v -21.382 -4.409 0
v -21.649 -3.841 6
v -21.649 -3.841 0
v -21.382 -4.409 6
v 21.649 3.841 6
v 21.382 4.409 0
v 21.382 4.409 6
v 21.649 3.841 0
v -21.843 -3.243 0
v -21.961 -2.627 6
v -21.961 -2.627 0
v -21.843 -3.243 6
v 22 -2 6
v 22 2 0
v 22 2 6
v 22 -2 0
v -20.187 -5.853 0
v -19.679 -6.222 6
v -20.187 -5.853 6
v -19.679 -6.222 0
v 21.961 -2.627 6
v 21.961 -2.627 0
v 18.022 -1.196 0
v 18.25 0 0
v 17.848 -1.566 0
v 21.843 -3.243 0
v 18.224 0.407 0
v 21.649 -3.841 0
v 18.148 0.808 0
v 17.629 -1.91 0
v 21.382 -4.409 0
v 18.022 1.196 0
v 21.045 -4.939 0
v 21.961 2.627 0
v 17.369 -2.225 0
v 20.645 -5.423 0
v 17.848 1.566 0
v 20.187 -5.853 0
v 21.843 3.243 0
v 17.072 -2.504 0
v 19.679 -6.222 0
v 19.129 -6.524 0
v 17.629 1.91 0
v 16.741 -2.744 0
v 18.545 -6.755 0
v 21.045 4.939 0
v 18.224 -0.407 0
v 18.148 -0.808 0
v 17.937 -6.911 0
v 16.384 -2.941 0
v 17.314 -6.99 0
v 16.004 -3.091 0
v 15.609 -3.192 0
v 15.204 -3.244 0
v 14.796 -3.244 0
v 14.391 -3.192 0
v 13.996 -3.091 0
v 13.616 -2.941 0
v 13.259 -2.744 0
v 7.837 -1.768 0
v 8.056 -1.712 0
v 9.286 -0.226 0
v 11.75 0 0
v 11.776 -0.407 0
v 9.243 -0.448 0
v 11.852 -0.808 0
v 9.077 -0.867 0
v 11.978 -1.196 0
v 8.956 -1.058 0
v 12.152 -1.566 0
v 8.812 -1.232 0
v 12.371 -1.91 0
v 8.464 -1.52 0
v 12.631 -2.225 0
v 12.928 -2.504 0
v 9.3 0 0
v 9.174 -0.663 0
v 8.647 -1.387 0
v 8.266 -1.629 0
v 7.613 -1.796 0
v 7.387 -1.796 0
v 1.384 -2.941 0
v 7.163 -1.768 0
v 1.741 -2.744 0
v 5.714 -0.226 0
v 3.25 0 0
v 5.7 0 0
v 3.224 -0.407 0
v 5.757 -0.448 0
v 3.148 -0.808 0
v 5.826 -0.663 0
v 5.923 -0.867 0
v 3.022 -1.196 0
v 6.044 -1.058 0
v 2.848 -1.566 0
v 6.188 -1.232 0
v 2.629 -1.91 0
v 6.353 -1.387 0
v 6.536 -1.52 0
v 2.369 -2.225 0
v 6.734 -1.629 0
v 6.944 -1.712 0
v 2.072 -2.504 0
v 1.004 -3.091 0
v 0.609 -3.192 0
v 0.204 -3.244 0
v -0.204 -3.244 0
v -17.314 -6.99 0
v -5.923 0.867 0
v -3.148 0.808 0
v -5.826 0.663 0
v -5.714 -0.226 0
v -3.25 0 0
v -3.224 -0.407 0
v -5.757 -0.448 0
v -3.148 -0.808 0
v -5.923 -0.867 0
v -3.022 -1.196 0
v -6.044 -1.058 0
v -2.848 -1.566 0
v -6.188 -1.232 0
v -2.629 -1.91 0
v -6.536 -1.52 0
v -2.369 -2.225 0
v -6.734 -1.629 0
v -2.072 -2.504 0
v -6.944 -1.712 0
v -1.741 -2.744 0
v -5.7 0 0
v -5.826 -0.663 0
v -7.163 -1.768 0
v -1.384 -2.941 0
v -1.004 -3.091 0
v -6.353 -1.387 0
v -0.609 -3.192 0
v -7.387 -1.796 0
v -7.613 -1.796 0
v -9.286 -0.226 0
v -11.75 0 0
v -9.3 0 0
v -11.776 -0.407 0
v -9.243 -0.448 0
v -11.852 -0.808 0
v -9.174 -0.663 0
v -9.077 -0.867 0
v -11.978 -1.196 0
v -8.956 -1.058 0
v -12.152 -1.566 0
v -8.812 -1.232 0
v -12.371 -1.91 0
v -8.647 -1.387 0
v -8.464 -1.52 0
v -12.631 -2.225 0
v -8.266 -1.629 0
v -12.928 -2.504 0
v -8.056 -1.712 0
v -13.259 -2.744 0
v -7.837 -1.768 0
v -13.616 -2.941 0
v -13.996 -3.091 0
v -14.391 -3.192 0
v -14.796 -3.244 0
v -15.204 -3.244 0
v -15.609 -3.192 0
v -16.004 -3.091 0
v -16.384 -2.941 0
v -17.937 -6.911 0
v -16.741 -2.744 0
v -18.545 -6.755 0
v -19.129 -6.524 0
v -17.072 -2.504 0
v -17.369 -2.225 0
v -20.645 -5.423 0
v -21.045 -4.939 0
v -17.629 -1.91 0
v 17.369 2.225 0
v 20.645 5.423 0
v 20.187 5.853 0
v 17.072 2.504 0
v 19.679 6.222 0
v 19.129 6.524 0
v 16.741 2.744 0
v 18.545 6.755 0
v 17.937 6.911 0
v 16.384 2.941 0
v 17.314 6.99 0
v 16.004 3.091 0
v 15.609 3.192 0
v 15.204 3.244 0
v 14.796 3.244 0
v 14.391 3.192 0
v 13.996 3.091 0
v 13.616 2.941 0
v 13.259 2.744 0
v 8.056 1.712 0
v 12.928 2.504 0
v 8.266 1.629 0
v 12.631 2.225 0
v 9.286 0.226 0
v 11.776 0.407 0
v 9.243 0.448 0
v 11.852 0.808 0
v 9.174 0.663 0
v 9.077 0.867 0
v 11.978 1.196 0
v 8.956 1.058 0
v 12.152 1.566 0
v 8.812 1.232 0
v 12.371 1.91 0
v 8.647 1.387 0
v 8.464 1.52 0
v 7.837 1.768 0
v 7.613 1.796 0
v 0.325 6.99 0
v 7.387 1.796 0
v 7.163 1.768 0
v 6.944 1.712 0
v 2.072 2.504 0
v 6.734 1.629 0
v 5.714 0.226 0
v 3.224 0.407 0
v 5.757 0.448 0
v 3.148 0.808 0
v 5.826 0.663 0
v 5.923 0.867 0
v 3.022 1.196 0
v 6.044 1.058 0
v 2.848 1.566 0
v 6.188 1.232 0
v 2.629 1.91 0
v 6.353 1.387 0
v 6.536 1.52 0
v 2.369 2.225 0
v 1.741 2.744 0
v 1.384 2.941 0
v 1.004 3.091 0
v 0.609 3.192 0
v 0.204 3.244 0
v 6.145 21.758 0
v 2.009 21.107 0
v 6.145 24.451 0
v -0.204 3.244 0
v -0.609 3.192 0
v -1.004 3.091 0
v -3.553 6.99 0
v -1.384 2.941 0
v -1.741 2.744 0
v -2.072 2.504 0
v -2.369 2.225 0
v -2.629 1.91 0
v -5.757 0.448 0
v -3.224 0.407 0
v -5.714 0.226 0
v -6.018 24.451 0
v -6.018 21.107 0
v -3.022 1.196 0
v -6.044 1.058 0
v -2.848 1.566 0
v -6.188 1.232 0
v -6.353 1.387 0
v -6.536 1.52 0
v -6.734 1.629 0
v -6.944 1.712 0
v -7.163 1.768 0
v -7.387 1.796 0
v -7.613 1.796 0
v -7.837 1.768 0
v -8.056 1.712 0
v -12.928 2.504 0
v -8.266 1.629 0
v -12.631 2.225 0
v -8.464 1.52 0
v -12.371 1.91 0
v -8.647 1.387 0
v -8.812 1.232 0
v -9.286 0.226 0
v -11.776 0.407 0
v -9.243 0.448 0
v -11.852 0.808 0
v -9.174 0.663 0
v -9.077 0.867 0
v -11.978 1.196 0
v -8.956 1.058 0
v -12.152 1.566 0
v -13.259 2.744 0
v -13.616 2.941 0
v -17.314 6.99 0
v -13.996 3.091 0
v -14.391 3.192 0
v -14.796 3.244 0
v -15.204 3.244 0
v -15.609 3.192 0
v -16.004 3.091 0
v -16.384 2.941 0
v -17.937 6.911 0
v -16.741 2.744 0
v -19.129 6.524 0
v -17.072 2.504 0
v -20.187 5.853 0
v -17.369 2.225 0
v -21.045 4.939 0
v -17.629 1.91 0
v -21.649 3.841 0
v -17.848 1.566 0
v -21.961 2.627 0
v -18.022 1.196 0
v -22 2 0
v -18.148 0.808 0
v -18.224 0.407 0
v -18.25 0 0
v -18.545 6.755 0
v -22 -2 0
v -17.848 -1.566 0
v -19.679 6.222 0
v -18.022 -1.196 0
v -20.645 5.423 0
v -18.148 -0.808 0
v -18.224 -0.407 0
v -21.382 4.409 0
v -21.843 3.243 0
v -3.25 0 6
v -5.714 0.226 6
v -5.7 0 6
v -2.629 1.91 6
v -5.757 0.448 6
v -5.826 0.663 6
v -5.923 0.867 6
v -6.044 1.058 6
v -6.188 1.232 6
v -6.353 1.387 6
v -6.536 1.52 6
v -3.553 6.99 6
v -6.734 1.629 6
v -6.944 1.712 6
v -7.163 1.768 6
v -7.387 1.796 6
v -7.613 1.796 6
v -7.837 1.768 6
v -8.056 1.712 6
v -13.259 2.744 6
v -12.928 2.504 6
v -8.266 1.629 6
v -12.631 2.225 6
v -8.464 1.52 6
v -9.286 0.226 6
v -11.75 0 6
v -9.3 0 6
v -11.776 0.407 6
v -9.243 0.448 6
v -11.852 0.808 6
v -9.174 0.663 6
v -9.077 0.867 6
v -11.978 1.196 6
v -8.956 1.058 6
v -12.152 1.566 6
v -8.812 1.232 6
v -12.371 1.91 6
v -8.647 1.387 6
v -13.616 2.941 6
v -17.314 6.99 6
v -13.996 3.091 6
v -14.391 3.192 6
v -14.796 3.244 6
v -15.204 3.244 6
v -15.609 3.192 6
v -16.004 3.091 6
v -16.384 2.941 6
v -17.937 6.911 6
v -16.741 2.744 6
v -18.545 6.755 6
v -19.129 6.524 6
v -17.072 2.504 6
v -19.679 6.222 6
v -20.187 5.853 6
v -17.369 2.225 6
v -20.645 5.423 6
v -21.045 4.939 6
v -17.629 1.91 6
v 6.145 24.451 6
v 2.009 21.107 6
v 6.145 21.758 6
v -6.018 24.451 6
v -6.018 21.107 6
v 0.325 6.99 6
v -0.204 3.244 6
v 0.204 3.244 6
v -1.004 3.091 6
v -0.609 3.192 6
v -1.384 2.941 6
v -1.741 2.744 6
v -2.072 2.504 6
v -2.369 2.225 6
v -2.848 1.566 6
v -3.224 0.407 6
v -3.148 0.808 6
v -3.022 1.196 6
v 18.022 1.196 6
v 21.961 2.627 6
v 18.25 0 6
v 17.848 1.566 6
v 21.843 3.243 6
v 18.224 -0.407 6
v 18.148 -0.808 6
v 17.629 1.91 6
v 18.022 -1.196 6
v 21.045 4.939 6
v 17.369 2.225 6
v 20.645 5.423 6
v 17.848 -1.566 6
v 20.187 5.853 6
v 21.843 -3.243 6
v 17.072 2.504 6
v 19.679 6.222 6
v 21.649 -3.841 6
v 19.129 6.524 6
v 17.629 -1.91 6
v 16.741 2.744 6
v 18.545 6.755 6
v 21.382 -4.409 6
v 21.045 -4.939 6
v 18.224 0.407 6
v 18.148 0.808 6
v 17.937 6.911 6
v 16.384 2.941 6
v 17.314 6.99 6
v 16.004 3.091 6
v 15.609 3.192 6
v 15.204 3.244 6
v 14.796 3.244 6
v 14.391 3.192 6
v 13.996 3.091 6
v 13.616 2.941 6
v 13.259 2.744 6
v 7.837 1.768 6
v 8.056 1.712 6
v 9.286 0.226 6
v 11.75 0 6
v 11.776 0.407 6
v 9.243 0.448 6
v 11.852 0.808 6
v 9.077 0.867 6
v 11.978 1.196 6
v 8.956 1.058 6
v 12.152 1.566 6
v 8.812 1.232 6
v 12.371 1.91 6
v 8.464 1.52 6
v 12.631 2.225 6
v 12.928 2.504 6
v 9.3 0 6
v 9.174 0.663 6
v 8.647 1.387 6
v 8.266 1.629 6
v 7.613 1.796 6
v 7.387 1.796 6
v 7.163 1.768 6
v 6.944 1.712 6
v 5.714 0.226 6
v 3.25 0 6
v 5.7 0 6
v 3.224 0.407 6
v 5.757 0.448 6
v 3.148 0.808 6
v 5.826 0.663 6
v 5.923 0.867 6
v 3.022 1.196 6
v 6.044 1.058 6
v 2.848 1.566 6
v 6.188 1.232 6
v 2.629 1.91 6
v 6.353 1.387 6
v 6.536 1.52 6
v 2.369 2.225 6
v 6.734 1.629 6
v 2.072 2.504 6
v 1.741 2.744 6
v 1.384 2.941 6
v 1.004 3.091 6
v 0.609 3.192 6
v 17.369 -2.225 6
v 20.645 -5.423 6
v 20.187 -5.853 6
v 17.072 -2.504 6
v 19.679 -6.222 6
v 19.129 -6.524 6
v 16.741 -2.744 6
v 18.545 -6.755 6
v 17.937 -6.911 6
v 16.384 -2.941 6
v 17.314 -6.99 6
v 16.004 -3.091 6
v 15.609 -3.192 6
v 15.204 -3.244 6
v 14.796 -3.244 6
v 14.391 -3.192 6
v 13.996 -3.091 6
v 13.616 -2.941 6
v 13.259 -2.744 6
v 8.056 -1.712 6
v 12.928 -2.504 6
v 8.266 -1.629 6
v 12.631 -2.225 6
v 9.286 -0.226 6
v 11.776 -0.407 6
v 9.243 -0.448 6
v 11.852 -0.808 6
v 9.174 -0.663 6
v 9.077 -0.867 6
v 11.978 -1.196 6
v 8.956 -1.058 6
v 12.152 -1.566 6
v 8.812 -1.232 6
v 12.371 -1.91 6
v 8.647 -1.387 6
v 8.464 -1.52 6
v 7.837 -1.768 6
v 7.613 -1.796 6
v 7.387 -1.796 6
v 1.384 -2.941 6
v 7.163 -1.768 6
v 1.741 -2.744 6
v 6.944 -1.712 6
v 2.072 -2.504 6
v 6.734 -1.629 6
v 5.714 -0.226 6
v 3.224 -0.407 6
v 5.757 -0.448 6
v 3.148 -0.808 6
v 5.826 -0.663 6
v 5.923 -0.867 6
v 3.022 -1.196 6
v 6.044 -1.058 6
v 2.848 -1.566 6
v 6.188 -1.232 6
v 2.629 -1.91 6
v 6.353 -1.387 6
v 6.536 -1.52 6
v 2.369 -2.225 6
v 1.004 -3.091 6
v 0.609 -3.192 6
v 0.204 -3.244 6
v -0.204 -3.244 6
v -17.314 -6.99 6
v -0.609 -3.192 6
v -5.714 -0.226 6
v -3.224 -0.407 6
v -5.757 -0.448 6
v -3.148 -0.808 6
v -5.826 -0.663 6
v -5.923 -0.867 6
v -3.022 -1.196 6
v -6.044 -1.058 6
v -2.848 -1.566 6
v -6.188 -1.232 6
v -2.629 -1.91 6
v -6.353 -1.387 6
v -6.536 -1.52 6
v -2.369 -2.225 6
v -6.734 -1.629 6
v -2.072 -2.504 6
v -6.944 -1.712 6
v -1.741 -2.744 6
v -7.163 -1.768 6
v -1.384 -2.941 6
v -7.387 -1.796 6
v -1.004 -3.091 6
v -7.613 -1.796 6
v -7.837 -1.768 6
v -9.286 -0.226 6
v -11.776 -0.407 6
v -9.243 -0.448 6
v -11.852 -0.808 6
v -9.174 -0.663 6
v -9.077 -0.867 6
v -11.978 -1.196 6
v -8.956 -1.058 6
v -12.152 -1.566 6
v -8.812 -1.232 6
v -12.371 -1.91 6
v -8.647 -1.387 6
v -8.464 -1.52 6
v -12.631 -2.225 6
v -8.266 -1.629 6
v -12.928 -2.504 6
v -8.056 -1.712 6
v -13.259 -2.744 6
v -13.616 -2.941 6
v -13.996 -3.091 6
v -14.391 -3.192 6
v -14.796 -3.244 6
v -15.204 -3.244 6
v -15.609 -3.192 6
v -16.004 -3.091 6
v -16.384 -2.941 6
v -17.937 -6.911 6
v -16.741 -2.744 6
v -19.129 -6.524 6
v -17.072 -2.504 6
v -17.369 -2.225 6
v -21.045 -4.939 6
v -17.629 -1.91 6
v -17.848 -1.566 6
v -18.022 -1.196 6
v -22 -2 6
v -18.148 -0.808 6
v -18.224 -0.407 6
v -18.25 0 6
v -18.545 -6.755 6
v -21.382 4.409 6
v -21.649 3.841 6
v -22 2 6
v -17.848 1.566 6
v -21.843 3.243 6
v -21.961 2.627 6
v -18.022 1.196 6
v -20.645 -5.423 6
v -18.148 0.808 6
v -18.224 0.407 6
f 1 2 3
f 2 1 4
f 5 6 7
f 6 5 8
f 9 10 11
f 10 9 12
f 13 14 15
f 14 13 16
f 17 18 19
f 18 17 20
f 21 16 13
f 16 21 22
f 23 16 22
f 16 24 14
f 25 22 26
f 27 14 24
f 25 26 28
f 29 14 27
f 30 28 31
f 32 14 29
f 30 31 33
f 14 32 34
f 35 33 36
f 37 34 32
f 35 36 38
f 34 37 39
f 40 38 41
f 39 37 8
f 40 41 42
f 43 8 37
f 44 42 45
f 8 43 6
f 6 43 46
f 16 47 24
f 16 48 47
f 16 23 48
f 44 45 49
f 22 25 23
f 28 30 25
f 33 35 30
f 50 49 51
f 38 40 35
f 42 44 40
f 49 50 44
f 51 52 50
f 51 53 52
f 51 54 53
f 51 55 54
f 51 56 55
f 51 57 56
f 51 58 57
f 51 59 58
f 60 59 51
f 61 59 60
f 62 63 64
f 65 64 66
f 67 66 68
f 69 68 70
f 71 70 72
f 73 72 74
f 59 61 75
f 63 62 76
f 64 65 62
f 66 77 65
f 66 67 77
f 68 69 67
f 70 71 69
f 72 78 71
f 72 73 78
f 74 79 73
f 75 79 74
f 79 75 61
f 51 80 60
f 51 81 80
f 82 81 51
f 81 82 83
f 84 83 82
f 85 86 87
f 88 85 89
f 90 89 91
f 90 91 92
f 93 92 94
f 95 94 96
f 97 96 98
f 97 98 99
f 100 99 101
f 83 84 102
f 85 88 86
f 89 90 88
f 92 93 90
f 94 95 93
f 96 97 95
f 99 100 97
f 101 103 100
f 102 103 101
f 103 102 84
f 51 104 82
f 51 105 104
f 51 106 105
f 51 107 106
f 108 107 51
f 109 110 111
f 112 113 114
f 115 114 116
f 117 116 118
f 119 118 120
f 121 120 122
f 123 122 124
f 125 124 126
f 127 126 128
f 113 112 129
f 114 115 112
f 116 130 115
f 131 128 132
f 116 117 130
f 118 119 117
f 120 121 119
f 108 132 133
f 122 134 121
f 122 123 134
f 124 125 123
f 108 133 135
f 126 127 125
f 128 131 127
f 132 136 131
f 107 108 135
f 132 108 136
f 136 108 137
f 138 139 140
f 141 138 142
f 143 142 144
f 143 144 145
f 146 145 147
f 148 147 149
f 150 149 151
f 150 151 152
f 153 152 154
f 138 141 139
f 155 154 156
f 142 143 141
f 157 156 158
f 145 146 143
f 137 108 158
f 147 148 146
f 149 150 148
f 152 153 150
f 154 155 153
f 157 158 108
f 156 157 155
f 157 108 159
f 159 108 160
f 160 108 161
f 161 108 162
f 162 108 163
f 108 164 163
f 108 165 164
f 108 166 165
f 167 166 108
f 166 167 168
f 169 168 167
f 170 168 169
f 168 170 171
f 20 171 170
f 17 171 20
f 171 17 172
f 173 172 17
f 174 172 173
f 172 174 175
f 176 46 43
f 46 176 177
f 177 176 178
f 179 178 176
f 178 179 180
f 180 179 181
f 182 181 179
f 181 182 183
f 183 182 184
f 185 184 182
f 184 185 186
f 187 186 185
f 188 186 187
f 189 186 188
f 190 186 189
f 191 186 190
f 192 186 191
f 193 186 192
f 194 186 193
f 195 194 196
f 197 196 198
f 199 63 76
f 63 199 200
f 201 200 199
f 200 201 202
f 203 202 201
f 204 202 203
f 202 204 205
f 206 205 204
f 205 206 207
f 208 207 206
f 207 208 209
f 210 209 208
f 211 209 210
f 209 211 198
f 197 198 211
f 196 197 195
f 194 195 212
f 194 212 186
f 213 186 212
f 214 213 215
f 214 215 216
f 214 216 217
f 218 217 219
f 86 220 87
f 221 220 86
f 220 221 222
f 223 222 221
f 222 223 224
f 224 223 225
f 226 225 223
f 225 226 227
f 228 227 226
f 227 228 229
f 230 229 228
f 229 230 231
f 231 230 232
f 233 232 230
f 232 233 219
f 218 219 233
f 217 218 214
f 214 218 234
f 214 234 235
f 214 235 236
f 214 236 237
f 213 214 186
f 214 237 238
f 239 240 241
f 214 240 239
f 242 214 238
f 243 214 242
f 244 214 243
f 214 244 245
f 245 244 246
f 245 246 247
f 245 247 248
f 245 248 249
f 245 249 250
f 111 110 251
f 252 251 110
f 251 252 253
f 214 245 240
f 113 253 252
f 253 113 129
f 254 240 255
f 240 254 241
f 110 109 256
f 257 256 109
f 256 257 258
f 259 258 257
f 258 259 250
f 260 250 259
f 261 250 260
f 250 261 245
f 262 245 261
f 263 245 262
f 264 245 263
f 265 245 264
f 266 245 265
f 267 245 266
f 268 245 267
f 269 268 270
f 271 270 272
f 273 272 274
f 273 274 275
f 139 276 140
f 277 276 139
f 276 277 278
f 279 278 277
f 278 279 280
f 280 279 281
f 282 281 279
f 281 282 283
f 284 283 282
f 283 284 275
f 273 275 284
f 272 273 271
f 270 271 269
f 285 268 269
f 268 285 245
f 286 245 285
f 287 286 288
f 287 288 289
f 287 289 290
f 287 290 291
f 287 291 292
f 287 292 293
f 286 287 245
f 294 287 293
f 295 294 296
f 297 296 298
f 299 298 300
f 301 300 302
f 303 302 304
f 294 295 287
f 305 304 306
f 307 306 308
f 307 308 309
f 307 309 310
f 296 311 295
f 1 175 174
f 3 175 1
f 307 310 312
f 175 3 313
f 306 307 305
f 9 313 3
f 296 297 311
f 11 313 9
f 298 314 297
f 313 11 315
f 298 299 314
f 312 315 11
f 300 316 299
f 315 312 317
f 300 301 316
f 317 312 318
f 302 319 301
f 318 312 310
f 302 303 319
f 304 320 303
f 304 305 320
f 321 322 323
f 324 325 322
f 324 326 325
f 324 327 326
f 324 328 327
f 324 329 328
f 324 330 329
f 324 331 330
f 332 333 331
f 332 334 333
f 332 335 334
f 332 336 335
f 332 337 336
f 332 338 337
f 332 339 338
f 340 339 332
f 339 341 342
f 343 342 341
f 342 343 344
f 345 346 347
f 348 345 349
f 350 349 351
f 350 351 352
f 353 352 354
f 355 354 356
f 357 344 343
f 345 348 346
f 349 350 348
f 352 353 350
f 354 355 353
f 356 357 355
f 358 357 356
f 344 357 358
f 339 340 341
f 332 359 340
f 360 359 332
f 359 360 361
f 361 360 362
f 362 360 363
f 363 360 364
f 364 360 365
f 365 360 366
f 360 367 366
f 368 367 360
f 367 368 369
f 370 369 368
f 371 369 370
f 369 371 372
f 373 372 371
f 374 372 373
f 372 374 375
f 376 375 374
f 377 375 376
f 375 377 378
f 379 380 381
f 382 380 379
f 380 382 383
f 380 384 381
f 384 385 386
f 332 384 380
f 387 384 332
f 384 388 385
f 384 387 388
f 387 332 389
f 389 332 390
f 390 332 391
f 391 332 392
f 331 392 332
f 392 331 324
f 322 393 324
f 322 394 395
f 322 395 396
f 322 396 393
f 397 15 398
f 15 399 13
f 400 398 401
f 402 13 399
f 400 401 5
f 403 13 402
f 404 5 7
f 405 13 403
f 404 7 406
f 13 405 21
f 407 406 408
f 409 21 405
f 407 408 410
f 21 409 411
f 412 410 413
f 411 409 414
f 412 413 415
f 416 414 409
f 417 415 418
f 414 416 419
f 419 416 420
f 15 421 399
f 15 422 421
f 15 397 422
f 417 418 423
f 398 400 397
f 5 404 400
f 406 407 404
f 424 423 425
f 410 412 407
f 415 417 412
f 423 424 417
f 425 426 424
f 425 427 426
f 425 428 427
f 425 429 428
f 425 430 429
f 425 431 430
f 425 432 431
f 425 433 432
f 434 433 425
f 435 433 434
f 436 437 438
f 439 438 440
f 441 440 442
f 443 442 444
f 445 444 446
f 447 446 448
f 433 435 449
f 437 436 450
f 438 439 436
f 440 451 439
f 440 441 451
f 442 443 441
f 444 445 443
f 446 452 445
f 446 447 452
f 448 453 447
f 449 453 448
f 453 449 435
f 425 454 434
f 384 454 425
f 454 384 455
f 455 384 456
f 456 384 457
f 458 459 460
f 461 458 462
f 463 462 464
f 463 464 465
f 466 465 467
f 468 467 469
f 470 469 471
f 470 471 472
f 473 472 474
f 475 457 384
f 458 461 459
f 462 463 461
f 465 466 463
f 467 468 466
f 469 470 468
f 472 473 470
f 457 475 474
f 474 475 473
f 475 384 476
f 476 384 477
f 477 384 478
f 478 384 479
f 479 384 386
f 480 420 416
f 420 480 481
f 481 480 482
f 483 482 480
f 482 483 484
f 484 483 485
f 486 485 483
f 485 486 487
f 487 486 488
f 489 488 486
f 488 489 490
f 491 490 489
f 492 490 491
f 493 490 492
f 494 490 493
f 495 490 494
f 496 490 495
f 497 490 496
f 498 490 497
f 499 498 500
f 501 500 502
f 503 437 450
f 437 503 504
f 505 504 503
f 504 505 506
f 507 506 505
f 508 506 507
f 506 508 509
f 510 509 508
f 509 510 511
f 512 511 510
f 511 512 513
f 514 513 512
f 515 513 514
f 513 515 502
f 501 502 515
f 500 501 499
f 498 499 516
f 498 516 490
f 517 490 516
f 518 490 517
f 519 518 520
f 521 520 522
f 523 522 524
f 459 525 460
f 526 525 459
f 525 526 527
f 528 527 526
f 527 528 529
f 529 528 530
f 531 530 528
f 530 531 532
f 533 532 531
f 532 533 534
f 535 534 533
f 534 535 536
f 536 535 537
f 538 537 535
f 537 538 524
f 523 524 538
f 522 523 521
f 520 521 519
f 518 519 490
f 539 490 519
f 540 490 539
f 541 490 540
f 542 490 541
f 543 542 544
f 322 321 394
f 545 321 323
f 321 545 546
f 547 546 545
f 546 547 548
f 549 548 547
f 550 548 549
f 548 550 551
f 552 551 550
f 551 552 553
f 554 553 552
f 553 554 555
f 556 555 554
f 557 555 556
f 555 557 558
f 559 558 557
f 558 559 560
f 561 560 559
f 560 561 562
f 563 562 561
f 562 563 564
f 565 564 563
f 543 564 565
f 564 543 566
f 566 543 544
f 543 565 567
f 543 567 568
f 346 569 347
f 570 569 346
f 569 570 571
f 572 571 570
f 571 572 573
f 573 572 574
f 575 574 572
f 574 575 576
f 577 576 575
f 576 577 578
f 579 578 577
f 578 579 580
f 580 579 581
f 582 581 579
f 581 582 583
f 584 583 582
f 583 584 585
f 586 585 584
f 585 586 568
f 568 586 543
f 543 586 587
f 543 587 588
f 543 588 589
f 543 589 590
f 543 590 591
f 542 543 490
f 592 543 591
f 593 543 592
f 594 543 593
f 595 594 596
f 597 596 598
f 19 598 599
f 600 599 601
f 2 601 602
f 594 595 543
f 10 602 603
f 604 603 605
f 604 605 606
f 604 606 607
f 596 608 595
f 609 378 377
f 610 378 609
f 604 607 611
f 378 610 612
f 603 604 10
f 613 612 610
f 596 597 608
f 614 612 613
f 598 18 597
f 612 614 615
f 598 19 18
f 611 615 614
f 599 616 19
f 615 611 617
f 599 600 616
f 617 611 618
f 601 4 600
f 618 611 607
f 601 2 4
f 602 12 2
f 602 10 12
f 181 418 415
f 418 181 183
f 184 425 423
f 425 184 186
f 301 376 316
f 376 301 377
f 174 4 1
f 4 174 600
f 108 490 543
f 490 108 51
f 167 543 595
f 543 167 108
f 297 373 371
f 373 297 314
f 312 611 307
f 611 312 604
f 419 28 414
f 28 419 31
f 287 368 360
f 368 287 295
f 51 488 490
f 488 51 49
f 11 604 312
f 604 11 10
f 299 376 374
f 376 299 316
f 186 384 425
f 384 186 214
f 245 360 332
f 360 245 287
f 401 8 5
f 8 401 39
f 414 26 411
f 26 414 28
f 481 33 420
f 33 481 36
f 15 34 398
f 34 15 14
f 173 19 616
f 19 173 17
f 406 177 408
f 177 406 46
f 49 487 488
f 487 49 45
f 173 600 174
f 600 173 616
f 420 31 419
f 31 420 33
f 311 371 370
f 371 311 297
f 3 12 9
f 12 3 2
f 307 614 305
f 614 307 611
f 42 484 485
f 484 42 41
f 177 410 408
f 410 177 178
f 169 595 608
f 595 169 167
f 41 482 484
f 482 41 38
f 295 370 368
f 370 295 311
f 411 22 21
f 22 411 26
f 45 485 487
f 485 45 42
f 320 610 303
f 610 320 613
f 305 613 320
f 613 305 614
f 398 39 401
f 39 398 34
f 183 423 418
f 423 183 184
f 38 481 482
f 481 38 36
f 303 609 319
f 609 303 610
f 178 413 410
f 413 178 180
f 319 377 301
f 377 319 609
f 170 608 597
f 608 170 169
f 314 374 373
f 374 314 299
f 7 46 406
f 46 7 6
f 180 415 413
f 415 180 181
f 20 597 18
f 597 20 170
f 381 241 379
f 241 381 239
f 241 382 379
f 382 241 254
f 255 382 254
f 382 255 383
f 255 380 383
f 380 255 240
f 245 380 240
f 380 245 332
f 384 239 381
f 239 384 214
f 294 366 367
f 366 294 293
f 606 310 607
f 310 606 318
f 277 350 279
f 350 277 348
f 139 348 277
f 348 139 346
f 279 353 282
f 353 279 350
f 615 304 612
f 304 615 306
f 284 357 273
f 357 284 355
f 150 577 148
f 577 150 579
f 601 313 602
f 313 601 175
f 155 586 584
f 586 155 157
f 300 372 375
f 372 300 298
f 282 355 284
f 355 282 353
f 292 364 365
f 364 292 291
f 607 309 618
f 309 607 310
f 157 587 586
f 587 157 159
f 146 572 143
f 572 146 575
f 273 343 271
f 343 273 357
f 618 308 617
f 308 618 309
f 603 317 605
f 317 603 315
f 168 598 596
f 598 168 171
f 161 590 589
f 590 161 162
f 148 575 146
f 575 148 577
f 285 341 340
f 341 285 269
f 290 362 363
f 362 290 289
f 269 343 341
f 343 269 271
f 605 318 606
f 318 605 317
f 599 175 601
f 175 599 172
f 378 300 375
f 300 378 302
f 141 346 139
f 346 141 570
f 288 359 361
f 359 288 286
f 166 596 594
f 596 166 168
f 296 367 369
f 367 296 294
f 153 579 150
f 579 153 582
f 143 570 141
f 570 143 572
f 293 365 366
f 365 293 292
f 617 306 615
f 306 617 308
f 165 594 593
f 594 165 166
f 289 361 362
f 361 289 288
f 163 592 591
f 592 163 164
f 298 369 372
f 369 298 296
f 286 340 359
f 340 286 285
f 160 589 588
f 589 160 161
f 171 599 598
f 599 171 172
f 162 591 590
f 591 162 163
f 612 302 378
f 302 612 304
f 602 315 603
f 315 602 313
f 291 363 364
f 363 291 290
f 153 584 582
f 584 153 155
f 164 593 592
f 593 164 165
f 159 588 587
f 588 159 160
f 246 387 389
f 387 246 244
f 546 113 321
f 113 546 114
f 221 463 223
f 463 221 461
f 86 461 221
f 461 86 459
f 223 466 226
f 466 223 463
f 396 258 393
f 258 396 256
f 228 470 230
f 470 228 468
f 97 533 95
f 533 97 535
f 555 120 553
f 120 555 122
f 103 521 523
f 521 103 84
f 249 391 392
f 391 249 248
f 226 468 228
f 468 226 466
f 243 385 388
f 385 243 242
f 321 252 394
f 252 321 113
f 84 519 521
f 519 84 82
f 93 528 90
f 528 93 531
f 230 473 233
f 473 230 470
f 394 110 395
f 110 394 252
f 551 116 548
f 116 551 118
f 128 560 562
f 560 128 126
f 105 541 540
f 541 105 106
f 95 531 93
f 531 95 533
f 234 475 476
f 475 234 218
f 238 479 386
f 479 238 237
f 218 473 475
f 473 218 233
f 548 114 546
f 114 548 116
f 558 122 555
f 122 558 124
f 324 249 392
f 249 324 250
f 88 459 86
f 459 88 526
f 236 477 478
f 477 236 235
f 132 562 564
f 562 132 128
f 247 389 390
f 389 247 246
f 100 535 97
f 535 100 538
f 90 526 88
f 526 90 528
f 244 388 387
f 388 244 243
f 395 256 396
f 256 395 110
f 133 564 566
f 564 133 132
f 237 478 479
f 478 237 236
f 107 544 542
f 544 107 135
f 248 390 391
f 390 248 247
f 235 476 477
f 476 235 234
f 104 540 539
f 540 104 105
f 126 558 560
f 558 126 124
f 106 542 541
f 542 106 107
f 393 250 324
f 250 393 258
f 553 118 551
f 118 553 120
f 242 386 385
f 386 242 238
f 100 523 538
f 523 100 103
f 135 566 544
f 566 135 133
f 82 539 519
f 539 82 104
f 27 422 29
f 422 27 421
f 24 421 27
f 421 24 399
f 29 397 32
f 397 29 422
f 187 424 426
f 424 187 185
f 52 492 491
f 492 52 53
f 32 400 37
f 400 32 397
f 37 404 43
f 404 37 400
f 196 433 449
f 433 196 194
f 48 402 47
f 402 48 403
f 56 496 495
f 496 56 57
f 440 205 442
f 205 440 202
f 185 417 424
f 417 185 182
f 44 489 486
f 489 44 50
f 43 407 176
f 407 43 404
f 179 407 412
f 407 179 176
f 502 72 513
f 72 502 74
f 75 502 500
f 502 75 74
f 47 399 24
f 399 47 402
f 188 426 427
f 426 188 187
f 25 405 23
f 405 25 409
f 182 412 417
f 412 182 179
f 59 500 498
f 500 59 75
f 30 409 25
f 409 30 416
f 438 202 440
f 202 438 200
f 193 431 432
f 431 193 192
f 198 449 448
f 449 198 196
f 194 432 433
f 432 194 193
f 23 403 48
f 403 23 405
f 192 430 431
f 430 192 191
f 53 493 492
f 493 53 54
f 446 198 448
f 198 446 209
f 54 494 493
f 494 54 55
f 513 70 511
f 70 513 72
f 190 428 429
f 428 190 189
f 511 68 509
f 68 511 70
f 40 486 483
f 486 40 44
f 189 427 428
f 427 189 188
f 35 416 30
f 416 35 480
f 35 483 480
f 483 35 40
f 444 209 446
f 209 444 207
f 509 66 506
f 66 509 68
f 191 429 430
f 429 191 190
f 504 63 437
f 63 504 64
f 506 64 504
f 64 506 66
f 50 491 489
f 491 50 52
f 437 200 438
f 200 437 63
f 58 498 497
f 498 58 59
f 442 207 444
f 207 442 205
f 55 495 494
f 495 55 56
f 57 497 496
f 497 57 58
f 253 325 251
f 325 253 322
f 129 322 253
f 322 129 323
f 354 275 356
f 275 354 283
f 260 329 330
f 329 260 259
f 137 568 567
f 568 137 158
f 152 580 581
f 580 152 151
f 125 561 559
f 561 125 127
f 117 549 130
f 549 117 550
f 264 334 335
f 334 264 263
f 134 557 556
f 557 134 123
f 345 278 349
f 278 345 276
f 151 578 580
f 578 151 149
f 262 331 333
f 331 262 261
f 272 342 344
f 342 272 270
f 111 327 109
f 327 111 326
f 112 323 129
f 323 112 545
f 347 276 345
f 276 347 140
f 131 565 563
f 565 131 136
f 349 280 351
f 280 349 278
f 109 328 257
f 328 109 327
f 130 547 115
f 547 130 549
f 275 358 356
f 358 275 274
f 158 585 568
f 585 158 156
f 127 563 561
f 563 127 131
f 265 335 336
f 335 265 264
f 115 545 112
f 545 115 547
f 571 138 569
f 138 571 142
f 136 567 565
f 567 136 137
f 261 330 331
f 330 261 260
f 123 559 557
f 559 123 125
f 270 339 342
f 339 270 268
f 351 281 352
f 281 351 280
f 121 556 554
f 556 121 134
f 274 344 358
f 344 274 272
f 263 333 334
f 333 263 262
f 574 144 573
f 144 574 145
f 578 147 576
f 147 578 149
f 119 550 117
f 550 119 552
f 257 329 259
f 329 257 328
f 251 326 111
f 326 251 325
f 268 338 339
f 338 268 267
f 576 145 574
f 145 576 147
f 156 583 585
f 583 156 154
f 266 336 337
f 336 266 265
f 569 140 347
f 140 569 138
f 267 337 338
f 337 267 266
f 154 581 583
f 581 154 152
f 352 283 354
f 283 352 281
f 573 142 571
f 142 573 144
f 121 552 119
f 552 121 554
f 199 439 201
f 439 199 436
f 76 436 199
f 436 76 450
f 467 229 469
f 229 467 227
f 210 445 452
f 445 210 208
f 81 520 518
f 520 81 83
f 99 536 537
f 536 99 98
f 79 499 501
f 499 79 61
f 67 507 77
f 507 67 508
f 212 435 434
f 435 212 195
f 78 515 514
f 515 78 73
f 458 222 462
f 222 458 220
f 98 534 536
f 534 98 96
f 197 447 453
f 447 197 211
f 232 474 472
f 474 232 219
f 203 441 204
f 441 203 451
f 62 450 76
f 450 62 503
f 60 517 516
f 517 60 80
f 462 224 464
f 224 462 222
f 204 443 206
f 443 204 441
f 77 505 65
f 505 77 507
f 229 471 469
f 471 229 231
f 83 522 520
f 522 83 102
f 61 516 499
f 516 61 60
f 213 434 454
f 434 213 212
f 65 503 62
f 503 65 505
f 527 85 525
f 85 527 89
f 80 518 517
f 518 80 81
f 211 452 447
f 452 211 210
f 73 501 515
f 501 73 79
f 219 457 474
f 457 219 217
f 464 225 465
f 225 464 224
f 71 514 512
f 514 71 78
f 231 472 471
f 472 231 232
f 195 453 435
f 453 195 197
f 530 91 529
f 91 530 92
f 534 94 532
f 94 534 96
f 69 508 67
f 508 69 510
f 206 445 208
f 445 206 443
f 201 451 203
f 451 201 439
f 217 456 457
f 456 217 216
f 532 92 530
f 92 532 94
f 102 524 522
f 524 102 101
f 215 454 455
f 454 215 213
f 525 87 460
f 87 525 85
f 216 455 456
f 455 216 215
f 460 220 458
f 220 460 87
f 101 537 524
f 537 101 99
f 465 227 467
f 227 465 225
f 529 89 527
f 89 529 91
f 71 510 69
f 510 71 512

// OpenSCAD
$fn = 50;


difference() {
	union() {
		hull() {
			translate(v = [-17.0000000000, 2.0000000000, 0]) {
				cylinder(h = 6, r = 5);
			}
			translate(v = [17.0000000000, 2.0000000000, 0]) {
				cylinder(h = 6, r = 5);
			}
			translate(v = [-17.0000000000, -2.0000000000, 0]) {
				cylinder(h = 6, r = 5);
			}
			translate(v = [17.0000000000, -2.0000000000, 0]) {
				cylinder(h = 6, r = 5);
			}
		}
		translate(v = [0, 24, 0]) {
			linear_extrude(height = 6) {
				text(font = "DejaVu Sans Mono:style=Bold", halign = "center", size = 19.0000000000, text = "7", valign = "top");
			}
		}
	}
	union() {
		translate(v = [-15.0000000000, 0.0000000000, 0]) {
			translate(v = [0, 0, -100]) {
				cylinder(h = 200, r = 3.2500000000);
			}
		}
		translate(v = [0, 0, -100]) {
			cylinder(h = 200, r = 3.2500000000);
		}
		translate(v = [15.0000000000, 0.0000000000, 0]) {
			translate(v = [0, 0, -100]) {
				cylinder(h = 200, r = 3.2500000000);
			}
		}
		translate(v = [-15.0000000000, 0.0000000000, 0]) {
			translate(v = [0, 0, -100]) {
				cylinder(h = 200, r = 1.8000000000);
			}
		}
		translate(v = [-7.5000000000, 0.0000000000, 0]) {
			translate(v = [0, 0, -100]) {
				cylinder(h = 200, r = 1.8000000000);
			}
		}
		translate(v = [0, 0, -100]) {
			cylinder(h = 200, r = 1.8000000000);
		}
		translate(v = [7.5000000000, 0.0000000000, 0]) {
			translate(v = [0, 0, -100]) {
				cylinder(h = 200, r = 1.8000000000);
			}
		}
		translate(v = [15.0000000000, 0.0000000000, 0]) {
			translate(v = [0, 0, -100]) {
				cylinder(h = 200, r = 1.8000000000);
			}
		}
	}
}
